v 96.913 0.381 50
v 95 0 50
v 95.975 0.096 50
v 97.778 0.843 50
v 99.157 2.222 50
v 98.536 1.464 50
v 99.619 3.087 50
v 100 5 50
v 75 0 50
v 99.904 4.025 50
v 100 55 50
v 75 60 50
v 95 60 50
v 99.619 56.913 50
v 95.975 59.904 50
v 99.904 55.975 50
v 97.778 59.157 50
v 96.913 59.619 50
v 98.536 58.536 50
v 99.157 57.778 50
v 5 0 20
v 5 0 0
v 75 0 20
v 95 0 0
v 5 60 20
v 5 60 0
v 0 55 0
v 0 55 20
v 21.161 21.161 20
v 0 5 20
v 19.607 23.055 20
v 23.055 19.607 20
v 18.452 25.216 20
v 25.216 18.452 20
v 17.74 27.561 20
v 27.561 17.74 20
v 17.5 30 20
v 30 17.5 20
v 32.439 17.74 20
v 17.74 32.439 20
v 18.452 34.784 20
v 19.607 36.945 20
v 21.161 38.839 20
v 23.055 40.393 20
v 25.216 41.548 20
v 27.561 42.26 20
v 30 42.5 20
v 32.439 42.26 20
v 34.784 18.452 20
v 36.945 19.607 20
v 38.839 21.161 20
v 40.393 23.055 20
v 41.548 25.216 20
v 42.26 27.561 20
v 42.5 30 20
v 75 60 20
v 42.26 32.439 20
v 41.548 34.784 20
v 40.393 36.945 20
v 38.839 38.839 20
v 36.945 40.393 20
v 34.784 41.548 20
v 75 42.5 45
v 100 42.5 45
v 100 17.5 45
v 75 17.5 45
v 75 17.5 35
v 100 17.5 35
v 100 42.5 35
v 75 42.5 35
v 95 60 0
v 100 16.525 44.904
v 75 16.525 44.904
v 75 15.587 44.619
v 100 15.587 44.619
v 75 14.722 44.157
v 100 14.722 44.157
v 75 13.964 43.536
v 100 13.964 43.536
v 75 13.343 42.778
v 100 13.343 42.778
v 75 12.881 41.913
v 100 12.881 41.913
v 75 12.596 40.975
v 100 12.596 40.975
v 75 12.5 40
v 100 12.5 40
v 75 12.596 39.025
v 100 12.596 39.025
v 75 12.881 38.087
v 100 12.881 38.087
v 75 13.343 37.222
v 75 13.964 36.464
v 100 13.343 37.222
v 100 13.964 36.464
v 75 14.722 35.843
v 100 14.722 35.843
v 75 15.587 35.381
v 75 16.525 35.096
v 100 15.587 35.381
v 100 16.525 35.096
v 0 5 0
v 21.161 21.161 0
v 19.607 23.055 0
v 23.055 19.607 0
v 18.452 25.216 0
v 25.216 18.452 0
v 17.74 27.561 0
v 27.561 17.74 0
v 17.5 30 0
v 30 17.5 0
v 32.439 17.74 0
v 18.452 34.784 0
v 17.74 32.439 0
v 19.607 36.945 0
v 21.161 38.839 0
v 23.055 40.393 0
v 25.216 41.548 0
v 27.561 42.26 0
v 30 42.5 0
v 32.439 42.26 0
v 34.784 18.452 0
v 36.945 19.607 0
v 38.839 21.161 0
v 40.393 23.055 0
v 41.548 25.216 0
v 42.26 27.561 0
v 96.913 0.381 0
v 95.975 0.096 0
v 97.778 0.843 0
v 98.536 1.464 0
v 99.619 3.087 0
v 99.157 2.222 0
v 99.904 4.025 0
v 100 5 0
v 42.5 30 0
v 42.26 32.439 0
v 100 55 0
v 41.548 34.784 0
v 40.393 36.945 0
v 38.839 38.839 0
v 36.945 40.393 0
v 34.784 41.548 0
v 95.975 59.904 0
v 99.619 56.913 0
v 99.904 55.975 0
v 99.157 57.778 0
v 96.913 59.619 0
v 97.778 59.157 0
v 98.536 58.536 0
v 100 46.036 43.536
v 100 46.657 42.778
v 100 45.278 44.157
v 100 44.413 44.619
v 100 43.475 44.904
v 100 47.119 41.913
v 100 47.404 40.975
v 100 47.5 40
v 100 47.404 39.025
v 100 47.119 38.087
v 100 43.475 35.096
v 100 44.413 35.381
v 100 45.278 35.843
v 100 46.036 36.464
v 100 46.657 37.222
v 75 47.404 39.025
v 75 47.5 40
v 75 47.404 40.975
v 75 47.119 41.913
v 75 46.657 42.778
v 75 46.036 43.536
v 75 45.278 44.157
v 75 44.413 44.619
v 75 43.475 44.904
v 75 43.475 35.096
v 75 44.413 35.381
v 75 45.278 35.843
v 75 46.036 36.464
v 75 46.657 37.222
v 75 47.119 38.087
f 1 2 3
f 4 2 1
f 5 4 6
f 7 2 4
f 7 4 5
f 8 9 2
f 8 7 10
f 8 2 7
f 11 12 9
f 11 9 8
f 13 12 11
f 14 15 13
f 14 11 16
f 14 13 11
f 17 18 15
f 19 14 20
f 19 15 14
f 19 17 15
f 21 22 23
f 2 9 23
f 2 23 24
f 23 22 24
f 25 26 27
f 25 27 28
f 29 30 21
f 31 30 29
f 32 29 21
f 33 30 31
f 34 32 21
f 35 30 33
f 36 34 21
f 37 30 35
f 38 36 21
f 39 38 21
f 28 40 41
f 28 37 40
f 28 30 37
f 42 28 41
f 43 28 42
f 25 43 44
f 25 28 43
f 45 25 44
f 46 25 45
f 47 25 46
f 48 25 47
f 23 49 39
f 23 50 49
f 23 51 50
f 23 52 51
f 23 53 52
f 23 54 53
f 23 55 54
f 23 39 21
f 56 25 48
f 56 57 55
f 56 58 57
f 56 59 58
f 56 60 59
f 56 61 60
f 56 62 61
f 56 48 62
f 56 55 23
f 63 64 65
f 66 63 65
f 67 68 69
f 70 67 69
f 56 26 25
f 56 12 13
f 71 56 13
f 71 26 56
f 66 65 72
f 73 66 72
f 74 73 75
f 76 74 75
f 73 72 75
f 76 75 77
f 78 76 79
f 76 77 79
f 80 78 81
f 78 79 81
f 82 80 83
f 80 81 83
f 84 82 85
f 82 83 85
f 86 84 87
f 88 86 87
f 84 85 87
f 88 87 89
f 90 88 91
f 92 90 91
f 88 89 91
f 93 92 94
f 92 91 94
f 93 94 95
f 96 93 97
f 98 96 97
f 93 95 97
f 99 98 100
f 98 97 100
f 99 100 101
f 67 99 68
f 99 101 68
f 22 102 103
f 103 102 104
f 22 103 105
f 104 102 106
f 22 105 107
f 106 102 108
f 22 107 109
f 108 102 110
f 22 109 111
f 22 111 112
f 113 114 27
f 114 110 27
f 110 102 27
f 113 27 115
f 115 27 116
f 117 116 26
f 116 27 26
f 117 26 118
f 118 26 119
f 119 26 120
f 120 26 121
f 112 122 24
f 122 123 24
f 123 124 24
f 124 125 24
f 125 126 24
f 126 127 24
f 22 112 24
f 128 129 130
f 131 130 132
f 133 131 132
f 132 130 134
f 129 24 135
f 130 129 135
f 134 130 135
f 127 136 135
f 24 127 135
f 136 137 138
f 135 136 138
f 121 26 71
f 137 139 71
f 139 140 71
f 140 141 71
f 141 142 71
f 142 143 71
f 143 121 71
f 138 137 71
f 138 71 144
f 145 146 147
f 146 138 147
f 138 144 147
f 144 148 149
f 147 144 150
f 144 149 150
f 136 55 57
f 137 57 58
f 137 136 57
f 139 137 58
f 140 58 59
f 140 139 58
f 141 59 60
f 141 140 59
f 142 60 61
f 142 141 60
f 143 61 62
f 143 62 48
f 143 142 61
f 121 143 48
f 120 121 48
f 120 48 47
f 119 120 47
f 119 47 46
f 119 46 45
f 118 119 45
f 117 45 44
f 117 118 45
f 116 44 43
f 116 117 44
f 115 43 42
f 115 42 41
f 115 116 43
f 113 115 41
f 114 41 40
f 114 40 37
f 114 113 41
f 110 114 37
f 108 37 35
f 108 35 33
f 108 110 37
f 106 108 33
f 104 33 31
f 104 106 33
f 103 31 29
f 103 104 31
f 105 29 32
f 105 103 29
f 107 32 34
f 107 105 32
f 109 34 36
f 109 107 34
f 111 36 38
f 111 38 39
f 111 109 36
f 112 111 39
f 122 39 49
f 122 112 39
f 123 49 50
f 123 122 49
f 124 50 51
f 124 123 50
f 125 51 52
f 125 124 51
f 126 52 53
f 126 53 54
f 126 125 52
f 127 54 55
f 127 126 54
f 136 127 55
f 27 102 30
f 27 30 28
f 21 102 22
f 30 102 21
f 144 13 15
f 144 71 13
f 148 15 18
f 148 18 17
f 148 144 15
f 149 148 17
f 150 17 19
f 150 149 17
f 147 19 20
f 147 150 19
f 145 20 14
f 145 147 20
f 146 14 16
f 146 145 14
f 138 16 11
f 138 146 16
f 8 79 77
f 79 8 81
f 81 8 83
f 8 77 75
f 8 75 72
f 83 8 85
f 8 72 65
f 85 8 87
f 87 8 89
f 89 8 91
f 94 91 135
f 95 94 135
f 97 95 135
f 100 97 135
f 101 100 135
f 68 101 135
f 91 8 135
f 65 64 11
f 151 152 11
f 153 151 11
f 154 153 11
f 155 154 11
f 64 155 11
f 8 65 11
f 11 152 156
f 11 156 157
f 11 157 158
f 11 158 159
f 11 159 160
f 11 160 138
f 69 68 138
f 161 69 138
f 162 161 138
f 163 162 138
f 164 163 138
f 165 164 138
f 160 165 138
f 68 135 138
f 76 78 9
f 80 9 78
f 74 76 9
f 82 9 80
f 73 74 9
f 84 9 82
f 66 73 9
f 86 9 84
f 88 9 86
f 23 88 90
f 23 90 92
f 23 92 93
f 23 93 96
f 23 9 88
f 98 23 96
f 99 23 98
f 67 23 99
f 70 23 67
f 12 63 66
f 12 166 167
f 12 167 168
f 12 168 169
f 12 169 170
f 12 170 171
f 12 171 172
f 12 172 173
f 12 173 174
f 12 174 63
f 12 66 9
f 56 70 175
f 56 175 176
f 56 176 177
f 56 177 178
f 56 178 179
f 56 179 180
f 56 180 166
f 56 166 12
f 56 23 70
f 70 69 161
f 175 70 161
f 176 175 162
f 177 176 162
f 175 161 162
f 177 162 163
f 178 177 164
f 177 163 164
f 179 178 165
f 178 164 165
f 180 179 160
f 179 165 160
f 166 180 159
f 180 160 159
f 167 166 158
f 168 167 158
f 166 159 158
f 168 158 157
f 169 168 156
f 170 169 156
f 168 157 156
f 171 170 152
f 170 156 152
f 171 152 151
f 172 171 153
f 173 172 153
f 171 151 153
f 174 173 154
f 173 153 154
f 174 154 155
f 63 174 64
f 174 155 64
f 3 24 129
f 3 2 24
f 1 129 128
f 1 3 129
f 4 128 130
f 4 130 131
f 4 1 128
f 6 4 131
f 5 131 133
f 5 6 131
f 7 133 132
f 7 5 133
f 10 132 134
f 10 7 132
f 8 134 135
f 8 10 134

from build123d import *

# Parameters (mm, degrees)
SKETCH_W     = 100
SKETCH_H     = 60
SKETCH_R     = 12.5
PAD_DEPTH    = 20
SKETCH001_W  = 25
SKETCH001_H  = 60
PAD001_DEPTH = 30
POCKET_DEPTH = 25
FILLET_R     = 5
CHAMFER_SIZE = 5


with BuildPart() as part:
    # Sketch → Pad (new body)
    with BuildSketch(Plane.XY):
        with Locations((50, 30)):
            Rectangle(SKETCH_W, SKETCH_H)
        with Locations((30, 30)):
            Circle(SKETCH_R, mode=Mode.SUBTRACT)
    extrude(amount=PAD_DEPTH)

    # Sketch001 (on Face7 of Pad) → Pad001 (join)
    with BuildSketch(Plane.XY.offset(20)):
        with Locations((87.5, 30)):
            Rectangle(SKETCH001_W, SKETCH001_H)
    extrude(amount=PAD001_DEPTH)

    # Sketch002 (on Face8 of Pad001) → Pocket (cut)
    with BuildSketch(Plane.YZ.offset(100)):
        with BuildLine():
            ThreePointArc((17.5, 45), (12.5, 40), (17.5, 35))
            Line((17.5, 35), (42.5, 35))
            ThreePointArc((42.5, 35), (47.5, 40), (42.5, 45))
            Line((42.5, 45), (17.5, 45))
        make_face()
    extrude(amount=-POCKET_DEPTH, mode=Mode.SUBTRACT)

    # Fillet
    fillet_edges = [part.edges().sort_by_distance(p)[0] for p in [
        (100, 0, 25),
        (100, 60, 25),
    ]]
    fillet(fillet_edges, radius=FILLET_R)

    # Chamfer
    chamfer_edges = [part.edges().sort_by_distance(p)[0] for p in [
        (0, 0, 10),
        (0, 60, 10),
    ]]
    chamfer(chamfer_edges, length=CHAMFER_SIZE)


solid = part.part
